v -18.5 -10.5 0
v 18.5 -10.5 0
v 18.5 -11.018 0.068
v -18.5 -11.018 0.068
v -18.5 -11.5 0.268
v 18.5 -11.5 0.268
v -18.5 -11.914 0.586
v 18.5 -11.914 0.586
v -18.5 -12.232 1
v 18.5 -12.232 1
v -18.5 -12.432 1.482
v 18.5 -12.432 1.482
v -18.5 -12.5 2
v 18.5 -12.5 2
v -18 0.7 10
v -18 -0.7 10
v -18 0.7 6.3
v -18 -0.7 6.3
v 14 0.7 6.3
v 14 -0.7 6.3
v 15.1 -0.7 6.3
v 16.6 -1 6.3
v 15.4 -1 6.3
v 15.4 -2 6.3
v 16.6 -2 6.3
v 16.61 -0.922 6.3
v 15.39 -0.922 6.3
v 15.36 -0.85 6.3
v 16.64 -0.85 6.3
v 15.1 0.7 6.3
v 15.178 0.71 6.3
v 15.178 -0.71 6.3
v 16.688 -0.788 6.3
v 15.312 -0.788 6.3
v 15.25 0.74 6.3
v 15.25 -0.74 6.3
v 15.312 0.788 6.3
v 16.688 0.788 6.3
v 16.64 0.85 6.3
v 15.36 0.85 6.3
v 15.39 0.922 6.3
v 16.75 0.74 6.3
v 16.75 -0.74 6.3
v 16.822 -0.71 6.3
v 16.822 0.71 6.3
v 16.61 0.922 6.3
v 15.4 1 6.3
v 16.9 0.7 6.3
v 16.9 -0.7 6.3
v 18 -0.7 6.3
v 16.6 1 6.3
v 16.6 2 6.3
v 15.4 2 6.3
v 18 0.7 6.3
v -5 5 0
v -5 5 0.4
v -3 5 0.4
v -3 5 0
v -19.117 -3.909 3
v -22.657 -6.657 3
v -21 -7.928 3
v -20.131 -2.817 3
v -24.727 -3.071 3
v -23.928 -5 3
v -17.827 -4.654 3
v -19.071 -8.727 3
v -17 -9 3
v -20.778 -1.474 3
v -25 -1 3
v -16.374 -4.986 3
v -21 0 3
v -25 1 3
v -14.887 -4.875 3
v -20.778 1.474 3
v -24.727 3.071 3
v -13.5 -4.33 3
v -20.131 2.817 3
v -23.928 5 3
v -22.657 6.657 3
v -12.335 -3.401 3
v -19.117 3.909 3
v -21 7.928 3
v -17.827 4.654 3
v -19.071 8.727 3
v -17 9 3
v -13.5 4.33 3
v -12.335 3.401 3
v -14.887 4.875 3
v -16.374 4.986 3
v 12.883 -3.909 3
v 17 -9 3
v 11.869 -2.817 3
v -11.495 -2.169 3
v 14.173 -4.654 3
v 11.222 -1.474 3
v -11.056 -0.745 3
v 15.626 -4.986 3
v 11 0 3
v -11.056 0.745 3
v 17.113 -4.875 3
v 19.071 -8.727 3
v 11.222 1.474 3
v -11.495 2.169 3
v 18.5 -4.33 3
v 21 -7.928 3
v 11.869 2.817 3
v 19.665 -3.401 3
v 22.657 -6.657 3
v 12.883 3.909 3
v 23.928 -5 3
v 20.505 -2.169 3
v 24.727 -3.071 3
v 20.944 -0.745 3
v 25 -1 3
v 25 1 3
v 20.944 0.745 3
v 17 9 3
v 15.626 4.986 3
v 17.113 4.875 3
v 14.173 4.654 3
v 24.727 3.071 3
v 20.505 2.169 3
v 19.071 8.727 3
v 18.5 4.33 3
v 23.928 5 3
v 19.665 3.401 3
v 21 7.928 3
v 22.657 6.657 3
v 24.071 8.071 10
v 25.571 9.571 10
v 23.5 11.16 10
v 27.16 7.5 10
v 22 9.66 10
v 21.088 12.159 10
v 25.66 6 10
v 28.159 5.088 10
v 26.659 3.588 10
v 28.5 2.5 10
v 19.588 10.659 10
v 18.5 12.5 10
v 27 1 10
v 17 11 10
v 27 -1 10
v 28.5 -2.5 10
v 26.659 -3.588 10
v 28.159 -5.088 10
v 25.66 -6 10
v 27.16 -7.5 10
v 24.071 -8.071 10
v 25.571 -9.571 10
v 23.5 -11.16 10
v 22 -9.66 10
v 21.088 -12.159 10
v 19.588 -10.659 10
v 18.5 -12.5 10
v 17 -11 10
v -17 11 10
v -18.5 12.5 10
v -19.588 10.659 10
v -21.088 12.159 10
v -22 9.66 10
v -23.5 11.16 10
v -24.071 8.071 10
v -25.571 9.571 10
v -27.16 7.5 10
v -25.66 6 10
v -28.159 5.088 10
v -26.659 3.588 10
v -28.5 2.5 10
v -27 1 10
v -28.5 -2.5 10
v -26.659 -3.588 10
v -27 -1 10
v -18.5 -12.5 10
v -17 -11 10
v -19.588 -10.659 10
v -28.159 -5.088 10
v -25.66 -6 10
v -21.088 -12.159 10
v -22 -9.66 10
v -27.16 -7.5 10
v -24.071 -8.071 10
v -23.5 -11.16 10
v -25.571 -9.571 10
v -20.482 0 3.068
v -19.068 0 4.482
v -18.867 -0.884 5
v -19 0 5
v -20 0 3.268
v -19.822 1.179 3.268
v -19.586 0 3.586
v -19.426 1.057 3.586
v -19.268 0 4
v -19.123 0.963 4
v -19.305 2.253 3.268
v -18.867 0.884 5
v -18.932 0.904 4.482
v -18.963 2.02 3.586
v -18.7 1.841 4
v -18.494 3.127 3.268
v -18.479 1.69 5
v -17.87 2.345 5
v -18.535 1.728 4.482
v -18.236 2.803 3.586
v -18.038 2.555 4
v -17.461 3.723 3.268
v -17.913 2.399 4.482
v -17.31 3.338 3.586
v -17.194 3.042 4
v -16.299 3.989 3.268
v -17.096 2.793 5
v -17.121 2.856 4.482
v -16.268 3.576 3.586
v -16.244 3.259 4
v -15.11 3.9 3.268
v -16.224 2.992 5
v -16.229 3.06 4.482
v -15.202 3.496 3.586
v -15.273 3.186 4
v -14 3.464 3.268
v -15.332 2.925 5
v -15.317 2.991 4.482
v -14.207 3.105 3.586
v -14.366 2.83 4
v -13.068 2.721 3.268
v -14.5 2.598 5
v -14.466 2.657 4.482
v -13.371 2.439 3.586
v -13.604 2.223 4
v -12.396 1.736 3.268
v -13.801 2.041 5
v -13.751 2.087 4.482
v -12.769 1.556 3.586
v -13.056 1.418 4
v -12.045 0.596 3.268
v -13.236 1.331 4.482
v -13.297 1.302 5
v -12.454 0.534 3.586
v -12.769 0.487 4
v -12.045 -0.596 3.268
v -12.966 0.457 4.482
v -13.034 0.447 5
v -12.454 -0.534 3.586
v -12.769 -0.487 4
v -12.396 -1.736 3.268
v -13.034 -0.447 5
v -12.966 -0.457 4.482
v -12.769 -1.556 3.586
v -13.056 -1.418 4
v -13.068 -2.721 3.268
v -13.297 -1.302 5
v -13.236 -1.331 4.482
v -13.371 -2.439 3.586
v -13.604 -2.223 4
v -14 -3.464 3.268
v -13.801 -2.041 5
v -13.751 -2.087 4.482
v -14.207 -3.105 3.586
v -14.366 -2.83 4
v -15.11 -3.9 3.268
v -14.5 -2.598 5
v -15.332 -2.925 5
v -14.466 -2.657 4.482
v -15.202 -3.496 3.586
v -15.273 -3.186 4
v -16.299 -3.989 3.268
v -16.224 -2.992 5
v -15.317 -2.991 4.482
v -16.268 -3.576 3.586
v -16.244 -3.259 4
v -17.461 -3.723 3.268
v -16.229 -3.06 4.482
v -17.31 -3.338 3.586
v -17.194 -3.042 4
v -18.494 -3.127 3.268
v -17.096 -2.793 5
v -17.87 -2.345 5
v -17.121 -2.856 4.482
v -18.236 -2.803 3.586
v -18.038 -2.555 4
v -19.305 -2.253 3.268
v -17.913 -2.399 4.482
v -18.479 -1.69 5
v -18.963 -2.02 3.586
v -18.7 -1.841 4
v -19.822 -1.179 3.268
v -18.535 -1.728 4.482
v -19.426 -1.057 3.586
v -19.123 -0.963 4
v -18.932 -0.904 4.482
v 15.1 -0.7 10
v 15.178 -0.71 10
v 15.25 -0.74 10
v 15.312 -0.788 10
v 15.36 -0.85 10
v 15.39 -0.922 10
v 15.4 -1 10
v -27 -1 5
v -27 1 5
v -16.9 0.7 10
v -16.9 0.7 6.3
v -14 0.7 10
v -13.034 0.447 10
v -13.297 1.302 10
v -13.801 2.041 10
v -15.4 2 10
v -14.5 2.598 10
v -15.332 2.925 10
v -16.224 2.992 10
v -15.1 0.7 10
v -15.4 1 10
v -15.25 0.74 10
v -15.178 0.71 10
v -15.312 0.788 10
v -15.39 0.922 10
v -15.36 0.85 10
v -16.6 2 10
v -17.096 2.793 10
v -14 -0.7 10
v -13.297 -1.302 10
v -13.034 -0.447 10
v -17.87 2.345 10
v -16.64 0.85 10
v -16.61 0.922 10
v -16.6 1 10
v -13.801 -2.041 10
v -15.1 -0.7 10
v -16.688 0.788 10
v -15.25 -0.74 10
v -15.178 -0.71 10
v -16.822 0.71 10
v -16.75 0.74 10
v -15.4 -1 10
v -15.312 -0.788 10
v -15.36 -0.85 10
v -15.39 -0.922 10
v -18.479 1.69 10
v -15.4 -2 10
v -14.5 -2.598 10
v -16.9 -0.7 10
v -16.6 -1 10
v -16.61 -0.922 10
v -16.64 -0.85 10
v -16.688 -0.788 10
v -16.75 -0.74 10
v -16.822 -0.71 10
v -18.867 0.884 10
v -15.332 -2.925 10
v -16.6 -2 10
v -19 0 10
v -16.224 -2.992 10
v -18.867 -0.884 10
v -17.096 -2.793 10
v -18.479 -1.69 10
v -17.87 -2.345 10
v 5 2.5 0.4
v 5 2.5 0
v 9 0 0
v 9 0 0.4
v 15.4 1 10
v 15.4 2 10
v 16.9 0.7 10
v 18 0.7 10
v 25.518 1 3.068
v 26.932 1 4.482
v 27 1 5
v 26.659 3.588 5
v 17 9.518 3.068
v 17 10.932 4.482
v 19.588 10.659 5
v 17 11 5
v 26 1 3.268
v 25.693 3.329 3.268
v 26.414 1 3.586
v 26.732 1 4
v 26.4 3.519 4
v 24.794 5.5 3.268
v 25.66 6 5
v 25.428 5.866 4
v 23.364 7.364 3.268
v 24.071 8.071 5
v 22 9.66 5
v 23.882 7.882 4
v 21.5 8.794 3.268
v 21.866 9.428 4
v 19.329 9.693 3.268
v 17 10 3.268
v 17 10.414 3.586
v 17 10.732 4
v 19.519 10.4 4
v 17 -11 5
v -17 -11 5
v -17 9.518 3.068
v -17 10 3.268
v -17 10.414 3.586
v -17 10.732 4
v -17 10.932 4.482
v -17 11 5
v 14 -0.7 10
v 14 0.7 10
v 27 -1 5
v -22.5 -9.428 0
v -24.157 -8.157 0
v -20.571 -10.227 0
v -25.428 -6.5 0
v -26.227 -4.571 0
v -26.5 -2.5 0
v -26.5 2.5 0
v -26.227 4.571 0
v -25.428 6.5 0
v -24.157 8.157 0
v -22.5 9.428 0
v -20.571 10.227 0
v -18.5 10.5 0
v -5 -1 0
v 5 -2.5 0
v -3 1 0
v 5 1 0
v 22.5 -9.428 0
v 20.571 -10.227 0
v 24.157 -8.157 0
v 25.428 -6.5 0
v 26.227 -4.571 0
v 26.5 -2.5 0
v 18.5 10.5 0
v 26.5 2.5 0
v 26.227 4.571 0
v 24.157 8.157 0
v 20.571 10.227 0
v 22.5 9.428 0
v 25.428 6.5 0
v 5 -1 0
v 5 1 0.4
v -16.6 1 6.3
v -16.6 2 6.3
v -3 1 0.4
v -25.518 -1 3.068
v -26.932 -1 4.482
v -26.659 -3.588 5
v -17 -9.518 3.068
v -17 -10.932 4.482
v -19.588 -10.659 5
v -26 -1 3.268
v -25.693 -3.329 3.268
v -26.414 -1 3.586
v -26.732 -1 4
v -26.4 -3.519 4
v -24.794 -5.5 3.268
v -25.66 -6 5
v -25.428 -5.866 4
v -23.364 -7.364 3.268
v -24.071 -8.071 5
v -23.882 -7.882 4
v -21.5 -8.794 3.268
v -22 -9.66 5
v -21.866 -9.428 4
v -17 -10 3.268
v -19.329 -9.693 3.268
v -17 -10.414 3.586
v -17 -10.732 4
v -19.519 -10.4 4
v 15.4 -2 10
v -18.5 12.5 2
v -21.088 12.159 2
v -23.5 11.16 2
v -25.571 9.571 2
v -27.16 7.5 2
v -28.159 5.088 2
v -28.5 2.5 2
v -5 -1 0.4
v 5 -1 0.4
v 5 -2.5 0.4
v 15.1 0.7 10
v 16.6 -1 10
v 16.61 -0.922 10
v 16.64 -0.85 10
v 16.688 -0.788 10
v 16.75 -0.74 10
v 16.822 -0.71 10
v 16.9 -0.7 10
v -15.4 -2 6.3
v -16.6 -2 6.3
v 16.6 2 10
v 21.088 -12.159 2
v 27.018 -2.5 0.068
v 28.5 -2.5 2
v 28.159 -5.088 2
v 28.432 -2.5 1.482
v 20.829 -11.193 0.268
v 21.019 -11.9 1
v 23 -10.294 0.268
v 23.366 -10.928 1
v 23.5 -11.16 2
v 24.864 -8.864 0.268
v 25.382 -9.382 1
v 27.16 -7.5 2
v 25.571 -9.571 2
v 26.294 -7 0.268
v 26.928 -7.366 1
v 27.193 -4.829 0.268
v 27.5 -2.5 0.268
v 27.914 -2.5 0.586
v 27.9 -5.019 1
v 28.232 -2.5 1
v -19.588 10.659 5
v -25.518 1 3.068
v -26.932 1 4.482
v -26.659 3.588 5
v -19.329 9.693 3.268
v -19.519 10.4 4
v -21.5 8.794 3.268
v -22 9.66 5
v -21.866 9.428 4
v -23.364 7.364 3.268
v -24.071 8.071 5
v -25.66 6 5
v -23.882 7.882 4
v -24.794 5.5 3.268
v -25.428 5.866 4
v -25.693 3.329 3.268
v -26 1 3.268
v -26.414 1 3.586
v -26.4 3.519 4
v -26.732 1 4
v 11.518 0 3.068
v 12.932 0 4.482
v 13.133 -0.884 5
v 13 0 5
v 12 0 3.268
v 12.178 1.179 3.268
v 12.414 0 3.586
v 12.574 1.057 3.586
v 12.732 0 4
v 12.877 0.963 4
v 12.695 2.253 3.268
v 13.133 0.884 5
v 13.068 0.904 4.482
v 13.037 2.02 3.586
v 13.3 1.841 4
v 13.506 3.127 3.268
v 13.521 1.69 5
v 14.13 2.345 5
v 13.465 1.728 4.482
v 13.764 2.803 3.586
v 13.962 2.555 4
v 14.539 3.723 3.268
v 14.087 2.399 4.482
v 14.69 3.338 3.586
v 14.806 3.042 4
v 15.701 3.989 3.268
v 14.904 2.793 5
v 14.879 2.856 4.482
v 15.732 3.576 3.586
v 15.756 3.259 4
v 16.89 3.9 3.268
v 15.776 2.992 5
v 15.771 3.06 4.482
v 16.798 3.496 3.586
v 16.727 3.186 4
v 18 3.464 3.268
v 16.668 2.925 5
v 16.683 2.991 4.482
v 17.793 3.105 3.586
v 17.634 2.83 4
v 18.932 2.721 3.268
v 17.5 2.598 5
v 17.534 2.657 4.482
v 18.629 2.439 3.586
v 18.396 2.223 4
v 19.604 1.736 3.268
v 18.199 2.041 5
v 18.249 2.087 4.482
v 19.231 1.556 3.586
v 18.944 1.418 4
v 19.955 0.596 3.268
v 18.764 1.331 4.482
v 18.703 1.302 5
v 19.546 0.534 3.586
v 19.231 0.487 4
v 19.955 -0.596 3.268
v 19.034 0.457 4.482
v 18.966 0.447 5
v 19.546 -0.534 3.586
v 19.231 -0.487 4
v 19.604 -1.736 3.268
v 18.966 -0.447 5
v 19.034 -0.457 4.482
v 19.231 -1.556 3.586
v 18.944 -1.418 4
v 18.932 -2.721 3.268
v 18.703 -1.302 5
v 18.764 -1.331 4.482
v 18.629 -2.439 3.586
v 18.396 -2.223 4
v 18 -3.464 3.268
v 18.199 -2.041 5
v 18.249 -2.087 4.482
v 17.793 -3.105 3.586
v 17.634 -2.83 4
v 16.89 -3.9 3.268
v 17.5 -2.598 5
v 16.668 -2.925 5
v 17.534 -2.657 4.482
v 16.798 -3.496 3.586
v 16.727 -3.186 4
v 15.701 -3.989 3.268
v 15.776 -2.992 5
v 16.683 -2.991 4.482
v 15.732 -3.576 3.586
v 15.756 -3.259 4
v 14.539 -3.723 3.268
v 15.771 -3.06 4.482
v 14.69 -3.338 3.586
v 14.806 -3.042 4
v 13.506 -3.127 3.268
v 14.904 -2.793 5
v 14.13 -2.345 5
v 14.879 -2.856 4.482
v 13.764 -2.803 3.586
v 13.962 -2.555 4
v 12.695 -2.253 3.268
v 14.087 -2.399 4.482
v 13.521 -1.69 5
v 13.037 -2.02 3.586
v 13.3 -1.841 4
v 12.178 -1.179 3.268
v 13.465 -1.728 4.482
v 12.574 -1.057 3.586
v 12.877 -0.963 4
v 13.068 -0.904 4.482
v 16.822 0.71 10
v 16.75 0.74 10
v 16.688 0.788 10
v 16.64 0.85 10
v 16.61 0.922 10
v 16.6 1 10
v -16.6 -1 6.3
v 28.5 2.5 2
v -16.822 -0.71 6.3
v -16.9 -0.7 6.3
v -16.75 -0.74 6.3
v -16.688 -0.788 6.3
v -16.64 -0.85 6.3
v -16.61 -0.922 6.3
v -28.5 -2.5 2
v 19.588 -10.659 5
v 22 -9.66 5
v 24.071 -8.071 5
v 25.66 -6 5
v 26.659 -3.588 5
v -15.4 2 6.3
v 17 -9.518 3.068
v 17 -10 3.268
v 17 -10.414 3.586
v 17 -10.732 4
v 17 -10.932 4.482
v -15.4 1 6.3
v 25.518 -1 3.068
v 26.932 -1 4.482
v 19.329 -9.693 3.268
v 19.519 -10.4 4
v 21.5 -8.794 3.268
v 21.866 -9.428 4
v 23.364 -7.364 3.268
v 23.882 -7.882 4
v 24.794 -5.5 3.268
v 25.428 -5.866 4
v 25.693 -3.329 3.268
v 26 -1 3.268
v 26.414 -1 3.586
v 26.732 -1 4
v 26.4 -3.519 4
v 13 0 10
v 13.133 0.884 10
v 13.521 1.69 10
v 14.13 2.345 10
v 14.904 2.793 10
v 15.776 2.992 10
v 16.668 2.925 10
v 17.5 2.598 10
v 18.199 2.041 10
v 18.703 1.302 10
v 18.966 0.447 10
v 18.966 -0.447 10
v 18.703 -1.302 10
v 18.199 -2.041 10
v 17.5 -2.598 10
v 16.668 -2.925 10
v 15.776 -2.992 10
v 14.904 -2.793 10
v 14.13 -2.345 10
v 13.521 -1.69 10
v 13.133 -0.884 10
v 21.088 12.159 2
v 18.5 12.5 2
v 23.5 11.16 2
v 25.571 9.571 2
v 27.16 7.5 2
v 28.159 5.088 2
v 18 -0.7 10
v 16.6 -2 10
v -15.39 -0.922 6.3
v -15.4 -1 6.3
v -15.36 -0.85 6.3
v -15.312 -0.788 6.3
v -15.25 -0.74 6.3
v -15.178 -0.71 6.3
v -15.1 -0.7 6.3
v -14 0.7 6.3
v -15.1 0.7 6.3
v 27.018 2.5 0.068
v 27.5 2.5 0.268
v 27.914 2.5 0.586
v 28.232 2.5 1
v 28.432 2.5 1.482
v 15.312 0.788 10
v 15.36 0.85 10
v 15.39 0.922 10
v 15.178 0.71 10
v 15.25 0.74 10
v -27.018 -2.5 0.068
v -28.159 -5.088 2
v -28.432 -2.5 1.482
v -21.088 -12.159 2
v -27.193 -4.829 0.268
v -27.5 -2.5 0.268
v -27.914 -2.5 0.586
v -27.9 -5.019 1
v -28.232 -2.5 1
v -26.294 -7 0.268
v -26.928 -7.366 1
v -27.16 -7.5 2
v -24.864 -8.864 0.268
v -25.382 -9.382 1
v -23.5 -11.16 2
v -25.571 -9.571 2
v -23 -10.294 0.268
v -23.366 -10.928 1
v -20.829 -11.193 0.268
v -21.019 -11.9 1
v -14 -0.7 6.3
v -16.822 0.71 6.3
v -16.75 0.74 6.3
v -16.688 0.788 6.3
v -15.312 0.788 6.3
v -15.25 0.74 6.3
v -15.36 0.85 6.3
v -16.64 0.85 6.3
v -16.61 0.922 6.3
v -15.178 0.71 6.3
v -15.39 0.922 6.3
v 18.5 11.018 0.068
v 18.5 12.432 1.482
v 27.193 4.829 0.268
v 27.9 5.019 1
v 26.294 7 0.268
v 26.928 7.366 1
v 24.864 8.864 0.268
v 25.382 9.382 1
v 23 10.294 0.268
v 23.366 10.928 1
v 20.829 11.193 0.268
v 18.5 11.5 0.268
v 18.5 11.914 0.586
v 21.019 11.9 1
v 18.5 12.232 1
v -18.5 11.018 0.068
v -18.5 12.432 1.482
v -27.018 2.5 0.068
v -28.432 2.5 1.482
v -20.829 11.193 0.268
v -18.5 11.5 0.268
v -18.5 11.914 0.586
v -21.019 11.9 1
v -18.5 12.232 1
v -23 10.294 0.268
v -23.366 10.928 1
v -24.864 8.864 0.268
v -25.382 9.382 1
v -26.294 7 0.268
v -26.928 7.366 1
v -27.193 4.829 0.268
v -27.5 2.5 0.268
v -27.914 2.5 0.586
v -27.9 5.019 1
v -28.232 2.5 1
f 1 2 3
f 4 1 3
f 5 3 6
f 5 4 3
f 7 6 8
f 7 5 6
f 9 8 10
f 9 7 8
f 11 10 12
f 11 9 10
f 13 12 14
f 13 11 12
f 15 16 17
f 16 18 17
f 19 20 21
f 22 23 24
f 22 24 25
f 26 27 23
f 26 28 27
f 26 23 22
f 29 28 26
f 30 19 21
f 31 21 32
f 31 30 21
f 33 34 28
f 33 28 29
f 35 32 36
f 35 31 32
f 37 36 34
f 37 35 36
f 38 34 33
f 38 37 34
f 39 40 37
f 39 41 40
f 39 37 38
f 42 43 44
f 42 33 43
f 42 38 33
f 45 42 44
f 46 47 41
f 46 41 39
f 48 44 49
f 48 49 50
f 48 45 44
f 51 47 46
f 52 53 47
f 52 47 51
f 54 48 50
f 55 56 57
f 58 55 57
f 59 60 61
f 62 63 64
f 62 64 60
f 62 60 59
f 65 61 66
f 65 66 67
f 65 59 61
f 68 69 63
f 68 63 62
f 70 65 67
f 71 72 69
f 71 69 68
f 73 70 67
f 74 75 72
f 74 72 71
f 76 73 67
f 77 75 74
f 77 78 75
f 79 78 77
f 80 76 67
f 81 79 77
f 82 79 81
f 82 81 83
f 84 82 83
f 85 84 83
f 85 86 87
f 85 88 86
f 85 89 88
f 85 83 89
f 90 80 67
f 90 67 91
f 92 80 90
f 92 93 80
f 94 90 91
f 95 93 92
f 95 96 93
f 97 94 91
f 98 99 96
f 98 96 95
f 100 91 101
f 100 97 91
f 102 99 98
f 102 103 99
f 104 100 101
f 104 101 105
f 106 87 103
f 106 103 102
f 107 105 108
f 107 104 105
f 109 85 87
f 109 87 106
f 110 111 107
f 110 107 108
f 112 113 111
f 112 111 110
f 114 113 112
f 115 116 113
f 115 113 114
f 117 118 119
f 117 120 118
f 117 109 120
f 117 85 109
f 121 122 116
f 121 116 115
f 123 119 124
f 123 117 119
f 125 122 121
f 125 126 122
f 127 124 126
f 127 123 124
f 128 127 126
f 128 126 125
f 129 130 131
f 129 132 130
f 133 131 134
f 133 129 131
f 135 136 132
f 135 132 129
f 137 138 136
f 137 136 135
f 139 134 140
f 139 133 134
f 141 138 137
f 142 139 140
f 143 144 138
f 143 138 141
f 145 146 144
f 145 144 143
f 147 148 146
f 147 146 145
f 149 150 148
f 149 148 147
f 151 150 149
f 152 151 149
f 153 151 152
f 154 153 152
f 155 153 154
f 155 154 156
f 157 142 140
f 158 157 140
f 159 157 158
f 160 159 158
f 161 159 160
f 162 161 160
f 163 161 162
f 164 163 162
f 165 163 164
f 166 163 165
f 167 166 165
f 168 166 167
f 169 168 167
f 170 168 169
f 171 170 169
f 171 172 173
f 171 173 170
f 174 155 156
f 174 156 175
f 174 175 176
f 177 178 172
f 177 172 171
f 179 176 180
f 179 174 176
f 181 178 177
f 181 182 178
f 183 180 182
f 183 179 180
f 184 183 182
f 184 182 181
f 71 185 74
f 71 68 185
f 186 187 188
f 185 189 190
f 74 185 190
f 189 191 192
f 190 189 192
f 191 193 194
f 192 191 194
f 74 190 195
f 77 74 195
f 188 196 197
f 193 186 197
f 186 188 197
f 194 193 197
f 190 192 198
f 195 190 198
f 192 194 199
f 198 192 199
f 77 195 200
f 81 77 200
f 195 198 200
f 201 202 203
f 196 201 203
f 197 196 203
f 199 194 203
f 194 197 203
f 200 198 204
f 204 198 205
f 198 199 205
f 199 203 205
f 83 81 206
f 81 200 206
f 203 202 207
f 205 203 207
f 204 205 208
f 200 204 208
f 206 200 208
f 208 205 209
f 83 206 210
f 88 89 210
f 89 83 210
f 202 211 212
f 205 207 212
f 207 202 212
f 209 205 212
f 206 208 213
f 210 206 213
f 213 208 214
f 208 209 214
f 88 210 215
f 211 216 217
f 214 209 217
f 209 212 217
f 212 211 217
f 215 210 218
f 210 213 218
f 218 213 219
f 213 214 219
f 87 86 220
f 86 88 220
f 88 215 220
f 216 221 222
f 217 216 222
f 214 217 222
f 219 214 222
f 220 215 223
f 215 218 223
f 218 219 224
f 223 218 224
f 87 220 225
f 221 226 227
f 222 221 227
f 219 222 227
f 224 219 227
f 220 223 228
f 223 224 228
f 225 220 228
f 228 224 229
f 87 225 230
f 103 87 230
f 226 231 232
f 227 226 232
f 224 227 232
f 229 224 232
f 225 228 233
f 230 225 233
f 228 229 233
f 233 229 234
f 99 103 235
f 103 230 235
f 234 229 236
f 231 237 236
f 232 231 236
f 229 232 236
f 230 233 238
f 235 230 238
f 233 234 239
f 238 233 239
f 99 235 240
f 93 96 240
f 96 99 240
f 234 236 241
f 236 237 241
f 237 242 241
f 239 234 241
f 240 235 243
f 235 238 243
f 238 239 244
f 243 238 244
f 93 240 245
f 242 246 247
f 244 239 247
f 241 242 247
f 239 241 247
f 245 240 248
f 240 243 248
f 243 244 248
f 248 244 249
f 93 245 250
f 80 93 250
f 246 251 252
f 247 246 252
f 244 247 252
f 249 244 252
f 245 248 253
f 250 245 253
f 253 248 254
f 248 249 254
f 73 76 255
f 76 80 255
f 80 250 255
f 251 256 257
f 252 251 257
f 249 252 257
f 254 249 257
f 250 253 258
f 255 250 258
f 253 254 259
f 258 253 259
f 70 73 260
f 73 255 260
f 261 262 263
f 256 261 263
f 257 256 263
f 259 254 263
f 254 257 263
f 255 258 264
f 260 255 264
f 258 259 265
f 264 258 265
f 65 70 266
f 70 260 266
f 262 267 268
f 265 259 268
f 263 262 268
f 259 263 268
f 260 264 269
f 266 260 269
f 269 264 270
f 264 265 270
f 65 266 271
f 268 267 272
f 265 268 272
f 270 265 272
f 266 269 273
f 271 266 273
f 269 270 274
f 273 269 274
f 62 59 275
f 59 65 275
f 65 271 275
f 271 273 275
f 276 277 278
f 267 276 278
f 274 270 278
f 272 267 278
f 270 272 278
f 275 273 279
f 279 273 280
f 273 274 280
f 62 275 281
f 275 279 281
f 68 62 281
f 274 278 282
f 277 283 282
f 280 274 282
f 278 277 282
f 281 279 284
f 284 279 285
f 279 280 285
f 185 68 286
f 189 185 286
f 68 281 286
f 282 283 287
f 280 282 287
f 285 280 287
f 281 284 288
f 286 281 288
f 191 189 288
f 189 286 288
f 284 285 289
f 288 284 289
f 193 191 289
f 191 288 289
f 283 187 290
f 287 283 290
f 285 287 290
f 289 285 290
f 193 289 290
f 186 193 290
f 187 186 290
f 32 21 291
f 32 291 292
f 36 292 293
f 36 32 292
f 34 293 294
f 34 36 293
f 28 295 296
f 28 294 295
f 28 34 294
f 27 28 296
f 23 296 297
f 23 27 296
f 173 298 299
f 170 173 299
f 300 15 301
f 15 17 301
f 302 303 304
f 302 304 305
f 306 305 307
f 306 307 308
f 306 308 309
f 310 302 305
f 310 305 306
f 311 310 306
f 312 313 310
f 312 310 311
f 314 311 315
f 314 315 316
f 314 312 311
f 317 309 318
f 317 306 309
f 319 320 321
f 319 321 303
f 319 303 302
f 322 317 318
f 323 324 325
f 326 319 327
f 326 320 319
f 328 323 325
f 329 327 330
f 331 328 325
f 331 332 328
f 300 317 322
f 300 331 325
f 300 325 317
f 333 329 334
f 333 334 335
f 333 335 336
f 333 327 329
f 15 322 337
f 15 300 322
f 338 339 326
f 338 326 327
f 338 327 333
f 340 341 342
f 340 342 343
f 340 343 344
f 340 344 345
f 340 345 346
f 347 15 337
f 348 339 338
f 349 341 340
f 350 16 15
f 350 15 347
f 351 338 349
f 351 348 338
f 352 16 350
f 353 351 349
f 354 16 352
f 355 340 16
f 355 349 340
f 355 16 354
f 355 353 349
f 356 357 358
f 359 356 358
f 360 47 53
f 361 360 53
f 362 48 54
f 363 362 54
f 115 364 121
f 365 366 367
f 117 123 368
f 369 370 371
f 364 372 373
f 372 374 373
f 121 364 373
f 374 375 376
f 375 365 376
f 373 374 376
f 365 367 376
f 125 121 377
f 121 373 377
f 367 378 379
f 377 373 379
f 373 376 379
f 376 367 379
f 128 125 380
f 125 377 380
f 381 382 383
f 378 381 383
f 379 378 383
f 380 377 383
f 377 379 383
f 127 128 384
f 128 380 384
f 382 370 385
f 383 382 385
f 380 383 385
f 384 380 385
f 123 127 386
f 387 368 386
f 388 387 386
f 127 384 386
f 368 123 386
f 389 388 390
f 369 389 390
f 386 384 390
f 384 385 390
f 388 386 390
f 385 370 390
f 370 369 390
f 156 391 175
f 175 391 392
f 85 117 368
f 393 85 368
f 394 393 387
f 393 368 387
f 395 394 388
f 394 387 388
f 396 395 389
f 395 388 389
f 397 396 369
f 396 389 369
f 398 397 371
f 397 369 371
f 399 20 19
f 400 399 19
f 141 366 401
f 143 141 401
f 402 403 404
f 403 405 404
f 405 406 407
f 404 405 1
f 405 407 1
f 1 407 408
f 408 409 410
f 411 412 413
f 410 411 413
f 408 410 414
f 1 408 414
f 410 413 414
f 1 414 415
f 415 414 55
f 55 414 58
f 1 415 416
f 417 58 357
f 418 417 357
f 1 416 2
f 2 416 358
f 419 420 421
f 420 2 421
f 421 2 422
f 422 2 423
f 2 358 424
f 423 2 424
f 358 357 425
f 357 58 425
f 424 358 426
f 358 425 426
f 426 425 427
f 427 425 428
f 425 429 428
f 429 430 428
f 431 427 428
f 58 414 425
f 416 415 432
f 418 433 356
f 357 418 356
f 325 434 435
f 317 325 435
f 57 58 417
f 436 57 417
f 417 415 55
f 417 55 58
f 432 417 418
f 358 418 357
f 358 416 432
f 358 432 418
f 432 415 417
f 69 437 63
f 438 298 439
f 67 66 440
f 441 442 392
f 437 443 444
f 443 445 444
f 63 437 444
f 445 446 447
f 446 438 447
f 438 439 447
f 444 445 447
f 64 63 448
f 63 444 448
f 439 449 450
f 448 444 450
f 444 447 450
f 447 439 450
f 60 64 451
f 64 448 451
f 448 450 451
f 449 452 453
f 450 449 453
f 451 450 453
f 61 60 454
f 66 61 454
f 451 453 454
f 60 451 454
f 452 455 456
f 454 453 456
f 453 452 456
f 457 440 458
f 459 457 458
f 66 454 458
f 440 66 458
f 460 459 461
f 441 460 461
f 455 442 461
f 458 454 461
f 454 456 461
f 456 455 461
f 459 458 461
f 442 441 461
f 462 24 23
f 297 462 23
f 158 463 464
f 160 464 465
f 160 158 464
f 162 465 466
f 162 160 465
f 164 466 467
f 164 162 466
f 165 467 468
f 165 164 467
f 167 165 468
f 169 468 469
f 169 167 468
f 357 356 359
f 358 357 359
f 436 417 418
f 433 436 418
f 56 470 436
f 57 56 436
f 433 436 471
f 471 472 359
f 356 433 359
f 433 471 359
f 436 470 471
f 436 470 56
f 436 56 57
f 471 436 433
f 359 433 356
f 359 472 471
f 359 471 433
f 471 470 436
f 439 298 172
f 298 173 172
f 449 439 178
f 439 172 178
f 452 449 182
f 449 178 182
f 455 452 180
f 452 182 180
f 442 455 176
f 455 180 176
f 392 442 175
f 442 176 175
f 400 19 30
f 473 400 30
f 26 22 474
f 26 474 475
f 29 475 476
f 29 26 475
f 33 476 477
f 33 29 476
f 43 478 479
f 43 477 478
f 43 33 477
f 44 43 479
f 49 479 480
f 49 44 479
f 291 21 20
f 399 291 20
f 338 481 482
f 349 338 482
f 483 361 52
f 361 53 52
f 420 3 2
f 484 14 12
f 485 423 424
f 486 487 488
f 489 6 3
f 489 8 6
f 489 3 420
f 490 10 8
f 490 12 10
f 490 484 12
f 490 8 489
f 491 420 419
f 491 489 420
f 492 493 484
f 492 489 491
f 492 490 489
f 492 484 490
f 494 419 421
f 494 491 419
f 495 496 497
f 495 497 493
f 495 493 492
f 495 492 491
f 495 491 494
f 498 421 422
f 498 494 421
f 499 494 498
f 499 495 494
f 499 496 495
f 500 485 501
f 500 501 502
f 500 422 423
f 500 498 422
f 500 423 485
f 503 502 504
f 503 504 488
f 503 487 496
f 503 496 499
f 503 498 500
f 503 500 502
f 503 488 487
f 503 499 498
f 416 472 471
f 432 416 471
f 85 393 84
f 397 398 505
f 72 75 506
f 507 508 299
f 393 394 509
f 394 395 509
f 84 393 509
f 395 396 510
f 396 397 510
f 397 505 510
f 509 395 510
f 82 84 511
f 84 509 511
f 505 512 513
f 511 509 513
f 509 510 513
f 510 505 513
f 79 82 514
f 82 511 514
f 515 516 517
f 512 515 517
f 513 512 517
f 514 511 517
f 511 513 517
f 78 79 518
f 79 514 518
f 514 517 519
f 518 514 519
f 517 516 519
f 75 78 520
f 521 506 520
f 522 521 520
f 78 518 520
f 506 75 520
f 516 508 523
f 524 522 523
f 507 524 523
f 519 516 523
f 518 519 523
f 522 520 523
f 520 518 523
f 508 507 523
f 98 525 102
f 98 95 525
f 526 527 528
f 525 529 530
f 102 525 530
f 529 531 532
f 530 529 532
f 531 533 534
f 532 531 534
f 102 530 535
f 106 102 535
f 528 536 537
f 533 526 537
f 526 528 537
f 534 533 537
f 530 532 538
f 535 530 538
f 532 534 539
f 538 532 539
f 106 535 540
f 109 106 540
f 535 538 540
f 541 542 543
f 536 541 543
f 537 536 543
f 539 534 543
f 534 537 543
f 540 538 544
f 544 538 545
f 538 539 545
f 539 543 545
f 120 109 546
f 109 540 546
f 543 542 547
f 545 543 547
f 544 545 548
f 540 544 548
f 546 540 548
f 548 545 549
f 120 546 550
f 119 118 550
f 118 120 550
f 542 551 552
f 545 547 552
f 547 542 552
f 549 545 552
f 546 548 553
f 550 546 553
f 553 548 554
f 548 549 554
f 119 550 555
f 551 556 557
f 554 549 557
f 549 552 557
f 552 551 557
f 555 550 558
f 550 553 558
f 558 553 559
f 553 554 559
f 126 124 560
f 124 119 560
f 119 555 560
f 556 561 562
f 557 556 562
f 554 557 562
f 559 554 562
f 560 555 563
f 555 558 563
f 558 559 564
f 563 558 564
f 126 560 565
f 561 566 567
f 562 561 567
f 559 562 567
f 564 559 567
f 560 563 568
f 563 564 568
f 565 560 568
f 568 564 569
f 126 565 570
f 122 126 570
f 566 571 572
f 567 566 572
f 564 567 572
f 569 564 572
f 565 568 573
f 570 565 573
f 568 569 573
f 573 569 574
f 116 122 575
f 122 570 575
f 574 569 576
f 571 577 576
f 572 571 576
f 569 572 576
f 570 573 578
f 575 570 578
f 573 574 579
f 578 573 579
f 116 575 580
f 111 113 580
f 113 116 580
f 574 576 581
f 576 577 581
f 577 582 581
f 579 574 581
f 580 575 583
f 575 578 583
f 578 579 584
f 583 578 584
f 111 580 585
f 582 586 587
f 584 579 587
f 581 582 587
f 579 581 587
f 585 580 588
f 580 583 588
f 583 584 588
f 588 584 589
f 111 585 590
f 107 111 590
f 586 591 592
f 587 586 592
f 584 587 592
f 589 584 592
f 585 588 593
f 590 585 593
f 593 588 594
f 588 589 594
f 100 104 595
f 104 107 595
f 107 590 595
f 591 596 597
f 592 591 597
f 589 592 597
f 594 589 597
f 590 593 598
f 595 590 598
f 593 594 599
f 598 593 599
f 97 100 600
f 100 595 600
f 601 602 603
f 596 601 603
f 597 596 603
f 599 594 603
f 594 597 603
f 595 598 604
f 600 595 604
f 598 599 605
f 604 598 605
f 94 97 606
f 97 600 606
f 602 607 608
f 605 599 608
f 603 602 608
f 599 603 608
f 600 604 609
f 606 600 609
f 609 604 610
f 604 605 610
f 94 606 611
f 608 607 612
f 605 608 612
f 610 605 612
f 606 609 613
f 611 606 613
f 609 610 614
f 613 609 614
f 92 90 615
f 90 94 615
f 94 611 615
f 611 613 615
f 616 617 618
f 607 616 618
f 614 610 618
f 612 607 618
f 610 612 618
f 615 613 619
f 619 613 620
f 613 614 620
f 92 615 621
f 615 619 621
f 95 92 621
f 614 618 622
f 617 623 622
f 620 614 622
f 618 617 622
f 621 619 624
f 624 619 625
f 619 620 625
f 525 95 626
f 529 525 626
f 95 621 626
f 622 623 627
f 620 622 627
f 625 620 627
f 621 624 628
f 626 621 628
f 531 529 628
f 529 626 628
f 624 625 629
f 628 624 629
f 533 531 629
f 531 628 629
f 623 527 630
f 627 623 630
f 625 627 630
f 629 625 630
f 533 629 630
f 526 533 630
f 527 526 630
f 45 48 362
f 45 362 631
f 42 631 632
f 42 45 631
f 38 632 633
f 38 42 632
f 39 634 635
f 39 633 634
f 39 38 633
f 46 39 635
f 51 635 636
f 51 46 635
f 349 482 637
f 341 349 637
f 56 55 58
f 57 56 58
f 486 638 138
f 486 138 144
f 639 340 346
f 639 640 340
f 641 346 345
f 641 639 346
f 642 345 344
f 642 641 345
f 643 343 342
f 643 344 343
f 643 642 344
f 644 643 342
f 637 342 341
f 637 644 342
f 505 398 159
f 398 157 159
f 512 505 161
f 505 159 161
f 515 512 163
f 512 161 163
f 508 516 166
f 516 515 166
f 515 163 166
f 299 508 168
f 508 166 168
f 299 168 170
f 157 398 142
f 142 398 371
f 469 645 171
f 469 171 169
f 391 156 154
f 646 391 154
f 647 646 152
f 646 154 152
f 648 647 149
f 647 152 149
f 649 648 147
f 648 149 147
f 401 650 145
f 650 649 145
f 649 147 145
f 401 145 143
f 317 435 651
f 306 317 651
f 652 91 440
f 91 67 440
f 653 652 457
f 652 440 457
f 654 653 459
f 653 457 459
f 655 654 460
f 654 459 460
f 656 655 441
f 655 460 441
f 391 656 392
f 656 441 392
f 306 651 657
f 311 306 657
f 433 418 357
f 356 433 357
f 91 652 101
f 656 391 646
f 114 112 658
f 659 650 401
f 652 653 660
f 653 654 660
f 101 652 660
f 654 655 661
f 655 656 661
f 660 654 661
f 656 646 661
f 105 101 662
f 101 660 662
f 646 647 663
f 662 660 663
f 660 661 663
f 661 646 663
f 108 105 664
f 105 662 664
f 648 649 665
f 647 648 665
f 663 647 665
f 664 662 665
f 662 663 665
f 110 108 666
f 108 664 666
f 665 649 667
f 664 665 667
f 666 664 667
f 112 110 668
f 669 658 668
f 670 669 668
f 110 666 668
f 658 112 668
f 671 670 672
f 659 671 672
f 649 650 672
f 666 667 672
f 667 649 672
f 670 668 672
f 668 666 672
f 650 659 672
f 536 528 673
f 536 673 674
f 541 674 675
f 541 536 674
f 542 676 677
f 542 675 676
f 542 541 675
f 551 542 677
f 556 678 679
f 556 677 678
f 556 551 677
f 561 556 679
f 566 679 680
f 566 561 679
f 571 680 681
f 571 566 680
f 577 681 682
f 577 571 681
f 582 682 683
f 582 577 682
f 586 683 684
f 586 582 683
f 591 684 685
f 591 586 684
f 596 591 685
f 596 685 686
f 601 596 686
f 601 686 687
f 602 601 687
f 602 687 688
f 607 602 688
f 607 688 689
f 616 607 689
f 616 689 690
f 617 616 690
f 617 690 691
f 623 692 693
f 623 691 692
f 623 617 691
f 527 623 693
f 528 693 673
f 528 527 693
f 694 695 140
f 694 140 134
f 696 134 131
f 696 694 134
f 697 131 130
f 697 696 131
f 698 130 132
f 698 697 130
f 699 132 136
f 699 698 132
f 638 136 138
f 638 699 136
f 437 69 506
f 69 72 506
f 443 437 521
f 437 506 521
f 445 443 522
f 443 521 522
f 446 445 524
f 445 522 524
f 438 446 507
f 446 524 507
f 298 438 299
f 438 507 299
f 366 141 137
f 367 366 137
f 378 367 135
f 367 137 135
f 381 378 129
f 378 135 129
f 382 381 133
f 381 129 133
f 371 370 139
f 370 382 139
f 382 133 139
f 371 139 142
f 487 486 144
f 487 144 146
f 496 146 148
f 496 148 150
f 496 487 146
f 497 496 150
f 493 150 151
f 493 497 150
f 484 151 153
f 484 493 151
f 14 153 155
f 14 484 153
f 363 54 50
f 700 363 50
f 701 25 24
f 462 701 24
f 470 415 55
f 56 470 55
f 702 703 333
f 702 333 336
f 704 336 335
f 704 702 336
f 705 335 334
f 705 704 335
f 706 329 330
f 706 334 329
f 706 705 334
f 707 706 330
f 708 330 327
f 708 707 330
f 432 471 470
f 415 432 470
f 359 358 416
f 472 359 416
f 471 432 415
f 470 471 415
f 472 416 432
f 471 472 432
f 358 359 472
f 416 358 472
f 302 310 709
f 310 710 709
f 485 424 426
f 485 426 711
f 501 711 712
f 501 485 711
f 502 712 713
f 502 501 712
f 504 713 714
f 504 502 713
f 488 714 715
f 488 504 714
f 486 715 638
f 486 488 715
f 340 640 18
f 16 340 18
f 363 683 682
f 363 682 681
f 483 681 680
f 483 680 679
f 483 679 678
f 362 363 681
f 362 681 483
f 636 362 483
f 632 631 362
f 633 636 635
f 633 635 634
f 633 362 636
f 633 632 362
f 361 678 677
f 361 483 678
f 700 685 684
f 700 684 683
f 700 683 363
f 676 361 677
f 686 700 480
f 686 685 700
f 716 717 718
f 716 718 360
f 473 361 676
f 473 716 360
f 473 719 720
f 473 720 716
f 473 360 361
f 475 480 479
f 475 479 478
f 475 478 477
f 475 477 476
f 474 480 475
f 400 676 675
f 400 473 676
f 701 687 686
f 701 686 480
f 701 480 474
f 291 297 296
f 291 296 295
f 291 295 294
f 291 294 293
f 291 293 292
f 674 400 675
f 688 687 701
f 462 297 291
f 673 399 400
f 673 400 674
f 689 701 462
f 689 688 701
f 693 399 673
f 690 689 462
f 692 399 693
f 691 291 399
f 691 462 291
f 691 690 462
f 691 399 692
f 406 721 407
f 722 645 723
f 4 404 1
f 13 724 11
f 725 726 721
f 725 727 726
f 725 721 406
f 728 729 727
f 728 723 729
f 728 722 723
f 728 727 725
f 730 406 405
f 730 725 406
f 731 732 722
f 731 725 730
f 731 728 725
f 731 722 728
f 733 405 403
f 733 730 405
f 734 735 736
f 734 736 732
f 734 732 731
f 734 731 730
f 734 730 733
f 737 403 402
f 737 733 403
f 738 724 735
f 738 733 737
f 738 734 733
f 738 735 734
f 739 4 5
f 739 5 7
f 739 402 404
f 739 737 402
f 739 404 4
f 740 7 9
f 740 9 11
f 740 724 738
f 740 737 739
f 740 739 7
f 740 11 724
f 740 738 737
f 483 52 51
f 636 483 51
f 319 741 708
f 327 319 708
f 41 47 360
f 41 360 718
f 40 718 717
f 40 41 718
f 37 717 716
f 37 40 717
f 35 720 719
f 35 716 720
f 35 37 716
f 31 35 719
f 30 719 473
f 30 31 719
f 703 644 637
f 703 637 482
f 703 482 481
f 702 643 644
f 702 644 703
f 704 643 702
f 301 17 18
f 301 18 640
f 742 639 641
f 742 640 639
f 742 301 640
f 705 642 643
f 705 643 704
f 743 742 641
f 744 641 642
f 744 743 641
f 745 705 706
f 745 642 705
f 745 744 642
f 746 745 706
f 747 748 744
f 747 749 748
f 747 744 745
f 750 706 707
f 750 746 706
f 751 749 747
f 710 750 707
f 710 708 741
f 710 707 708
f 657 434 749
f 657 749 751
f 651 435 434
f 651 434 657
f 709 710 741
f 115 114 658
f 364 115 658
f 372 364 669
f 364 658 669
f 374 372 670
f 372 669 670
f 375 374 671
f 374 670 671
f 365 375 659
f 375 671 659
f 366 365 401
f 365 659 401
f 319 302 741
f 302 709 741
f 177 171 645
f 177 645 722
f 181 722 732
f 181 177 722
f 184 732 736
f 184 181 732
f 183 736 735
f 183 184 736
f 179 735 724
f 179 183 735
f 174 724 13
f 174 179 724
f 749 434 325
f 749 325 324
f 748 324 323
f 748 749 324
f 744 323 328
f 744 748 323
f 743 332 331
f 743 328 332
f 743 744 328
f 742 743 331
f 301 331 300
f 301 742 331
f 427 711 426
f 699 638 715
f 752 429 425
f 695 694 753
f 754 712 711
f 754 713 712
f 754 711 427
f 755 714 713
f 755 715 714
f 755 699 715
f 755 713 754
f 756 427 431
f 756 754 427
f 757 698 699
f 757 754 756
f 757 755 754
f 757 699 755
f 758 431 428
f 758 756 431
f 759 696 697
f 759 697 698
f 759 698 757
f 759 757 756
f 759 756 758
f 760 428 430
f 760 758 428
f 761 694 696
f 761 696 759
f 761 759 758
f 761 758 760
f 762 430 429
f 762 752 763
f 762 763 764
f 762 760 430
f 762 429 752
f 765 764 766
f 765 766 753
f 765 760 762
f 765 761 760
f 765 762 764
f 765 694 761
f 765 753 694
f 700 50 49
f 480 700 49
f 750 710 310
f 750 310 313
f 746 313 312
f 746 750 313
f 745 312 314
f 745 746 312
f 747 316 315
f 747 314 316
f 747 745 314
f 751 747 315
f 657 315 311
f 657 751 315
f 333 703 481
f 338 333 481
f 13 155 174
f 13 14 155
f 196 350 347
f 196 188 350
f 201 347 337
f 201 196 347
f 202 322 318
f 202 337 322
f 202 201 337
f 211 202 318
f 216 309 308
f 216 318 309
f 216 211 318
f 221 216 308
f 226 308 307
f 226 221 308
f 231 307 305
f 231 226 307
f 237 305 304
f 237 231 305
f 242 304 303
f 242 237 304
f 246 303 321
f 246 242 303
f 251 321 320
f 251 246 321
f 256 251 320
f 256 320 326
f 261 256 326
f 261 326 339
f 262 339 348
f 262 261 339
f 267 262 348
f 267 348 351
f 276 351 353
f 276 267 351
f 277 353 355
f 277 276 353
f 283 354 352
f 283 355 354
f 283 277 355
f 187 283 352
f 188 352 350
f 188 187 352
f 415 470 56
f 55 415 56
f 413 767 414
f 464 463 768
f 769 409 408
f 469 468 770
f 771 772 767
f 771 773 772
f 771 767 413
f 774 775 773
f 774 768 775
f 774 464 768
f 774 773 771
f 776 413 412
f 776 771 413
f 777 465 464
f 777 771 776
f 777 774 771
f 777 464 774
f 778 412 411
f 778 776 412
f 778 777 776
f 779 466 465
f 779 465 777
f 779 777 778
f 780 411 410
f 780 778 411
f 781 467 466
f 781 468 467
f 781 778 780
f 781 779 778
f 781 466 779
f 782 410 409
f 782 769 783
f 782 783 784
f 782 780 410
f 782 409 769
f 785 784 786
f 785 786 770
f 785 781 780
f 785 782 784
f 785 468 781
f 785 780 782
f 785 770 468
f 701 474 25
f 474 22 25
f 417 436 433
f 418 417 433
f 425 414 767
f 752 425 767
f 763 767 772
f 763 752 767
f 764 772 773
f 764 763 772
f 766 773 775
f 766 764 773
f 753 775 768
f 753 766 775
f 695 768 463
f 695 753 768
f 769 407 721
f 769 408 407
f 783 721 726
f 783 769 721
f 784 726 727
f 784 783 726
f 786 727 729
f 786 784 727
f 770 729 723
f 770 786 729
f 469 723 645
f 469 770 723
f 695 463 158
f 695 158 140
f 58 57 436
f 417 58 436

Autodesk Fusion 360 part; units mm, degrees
sketch "Sketch1" plane through (0, 0, 0) normal (0, 0, 1) x (1, 0, 0)
  line L0 (-28.5, 12.5) -> (28.5, 12.5)
  line L1 (28.5, 12.5) -> (28.5, -12.5)
  line L2 (28.5, -12.5) -> (-28.5, -12.5)
  line L3 (-28.5, -12.5) -> (-28.5, 12.5)
  dimension "d1" = 25
  dimension "d2" = 57
  dimension "d3" = 12.5
  dimension "d4" = 28.5
extrude "Extrude1" add sketch "Sketch1" along normal blind 3 makes body 1
sketch "Sketch2" plane through (0, 0, 3) normal (0, 0, 1) x (-1, 0, 0)
  line L0 (28.5, 12.5) -> (-28.5, 12.5)
  line L1 (-28.5, 12.5) -> (-28.5, -12.5)
  line L2 (-28.5, -12.5) -> (28.5, -12.5)
  line L3 (28.5, -12.5) -> (28.5, 12.5)
  line L4 (28.5, -12.5) -> (-28.5, -12.5)
  line L5 (-28.5, -12.5) -> (-28.5, 12.5)
  line L6 (-28.5, 12.5) -> (28.5, 12.5)
  line L7 (28.5, 12.5) -> (28.5, -12.5)
  line L8 (27, -11) -> (-27, -11)
  line L9 (-27, -11) -> (-27, 11)
  line L10 (-27, 11) -> (27, 11)
  line L11 (27, 11) -> (27, -11)
  line L12 (16.6, -2) -> (15.4, -2)
  line L13 (16.6, -1) -> (16.6, -2)
  arc A0 (-16.9, 0.7) -> (-16.6, 1) centre (-16.9, 1) ccw
  line L14 (14, -0.7) -> (14, 0.7)
  line L15 (-18, 0.7) -> (-16.9, 0.7)
  line L16 (-16.6, 1) -> (-16.6, 2)
  line L17 (-18, -0.7) -> (-18, 0.7)
  arc A1 (15.4, -1) -> (15.1, -0.7) centre (15.1, -1) ccw
  circle A2 centre (-16, 0) radius 3
  line L18 (-15.4, 2) -> (-15.4, 1)
  line L19 (14, 0.7) -> (15.1, 0.7)
  line L20 (-14, 0.7) -> (-14, -0.7)
  arc A3 (-16.6, -1) -> (-16.9, -0.7) centre (-16.9, -1) ccw
  line L21 (15.4, 2) -> (16.6, 2)
  line L22 (-15.4, -2) -> (-16.6, -2)
  line L23 (-16.9, -0.7) -> (-18, -0.7)
  line L24 (18, -0.7) -> (16.9, -0.7)
  arc A4 (-15.1, -0.7) -> (-15.4, -1) centre (-15.1, -1) ccw
  circle A5 centre (16, 0) radius 3
  line L25 (15.1, -0.7) -> (14, -0.7)
  arc A6 (16.9, -0.7) -> (16.6, -1) centre (16.9, -1) ccw
  line L26 (-16.6, 2) -> (-15.4, 2)
  line L27 (-15.1, 0.7) -> (-14, 0.7)
  line L28 (-15.4, -1) -> (-15.4, -2)
  line L29 (16.6, 2) -> (16.6, 1)
  line L30 (-14, -0.7) -> (-15.1, -0.7)
  arc A7 (-15.4, 1) -> (-15.1, 0.7) centre (-15.1, 1) ccw
  line L31 (15.4, 1) -> (15.4, 2)
  line L32 (15.4, -2) -> (15.4, -1)
  arc A8 (16.6, 1) -> (16.9, 0.7) centre (16.9, 1) ccw
  arc A9 (15.1, 0.7) -> (15.4, 1) centre (15.1, 1) ccw
  line L33 (-16.6, -2) -> (-16.6, -1)
  line L34 (18, 0.7) -> (18, -0.7)
  line L35 (16.9, 0.7) -> (18, 0.7)
  point P0 (-16, 0)
  point P1 (16, 0)
  point P2 (-15.4, 0.7)
  point P3 (16.6, 0.7)
  dimension "d7" = 1.5
  dimension "d8" = 1.5
  dimension "d9" = 1.5
  dimension "d10" = 1.5
  dimension "d11" = 4
  dimension "d12" = 4
  dimension "d13" = 2
  dimension "d14" = 2
  dimension "d15" = 1.2
  dimension "d16" = 1.4
  dimension "d17" = 0.7
  dimension "d18" = 0.6
  dimension "d19" = 0.3
  dimension "d20" = 6
  dimension "d21" = 4
  dimension "d22" = 4
  dimension "d23" = 2
  dimension "d24" = 2
  dimension "d25" = 1.2
  dimension "d26" = 1.4
  dimension "d27" = 0.7
  dimension "d28" = 0.6
  dimension "d29" = 0.3
  dimension "d30" = 6
  dimension "d31" = 32
  dimension "d32" = 16
extrude "Extrude2" add sketch "Sketch2" along normal blind 7 bodies 1
extrude "Extrude5" add 2 faces at (15.7655, 0.2578, 3) (-16.2345, -0.2578, 3) along direction (0, 0, 1) blind 3.3 on bodies 1 bodies 1
fillet "Fillet1" radius 10 8 edges at (28.5, 12.5, 5) (27, 11, 6.5) (27, -11, 6.5) (28.5, -12.5, 5) (-27, -11, 6.5) (-28.5, -12.5, 5) (-27, 11, 6.5) (-28.5, 12.5, 5) on bodies 1
fillet "Fillet1" radius 2 2 faces at (-4.968, -8.2642, 3) (-9.5, 4.1667, 0) on bodies 1
sketch "Sketch3" plane through (0, 0, 0) normal (0, 0, -1) x (1, 0, 0)
  arc A0 (18.5, -10.5) -> (26.5, -2.5) centre (18.5, -2.5) ccw
  line L0 (26.5, -2.5) -> (26.5, 2.5)
  arc A1 (26.5, 2.5) -> (18.5, 10.5) centre (18.5, 2.5) ccw
  line L1 (18.5, 10.5) -> (-18.5, 10.5)
  arc A2 (-18.5, 10.5) -> (-26.5, 2.5) centre (-18.5, 2.5) ccw
  line L2 (-26.5, 2.5) -> (-26.5, -2.5)
  arc A3 (-26.5, -2.5) -> (-18.5, -10.5) centre (-18.5, -2.5) ccw
  line L3 (-18.5, -10.5) -> (18.5, -10.5)
  line L4 (-3, -5) -> (-3, -1)
  line L5 (-3, -1) -> (5, -1)
  line L6 (5, -1) -> (5, -2.5)
  line L7 (5, -2.5) -> (9, 0)
  line L8 (9, 0) -> (5, 2.5)
  line L9 (5, 2.5) -> (5, 1)
  line L10 (5, 1) -> (-5, 1)
  line L11 (-5, 1) -> (-5, -5)
  line L12 (-5, -5) -> (-3, -5)
  dimension "d39" = 2
  dimension "d40" = 2
  dimension "d41" = 1.5
  dimension "d42" = 1.5
  dimension "d43" = 1
  dimension "d44" = 10
  dimension "d45" = 6
  dimension "d46" = 4
  dimension "d47" = 9
  dimension "d48" = 1
extrude "Extrude3" cut sketch "Sketch3" against normal blind 0.4 contours L4 L5 L6 L7 L8 L9 L10 L11 L12 bodies 1
extrude "Extrude4" add 1 faces at (-1, -0.3333, 0.4) along direction (0, 0, -1) blind 0.4 separate body on bodies 1 makes body 2
equation "d3 = ( 25 / 2 ) * 1 mm"
equation "d4 = ( 57 / 2 ) * 1 mm"
